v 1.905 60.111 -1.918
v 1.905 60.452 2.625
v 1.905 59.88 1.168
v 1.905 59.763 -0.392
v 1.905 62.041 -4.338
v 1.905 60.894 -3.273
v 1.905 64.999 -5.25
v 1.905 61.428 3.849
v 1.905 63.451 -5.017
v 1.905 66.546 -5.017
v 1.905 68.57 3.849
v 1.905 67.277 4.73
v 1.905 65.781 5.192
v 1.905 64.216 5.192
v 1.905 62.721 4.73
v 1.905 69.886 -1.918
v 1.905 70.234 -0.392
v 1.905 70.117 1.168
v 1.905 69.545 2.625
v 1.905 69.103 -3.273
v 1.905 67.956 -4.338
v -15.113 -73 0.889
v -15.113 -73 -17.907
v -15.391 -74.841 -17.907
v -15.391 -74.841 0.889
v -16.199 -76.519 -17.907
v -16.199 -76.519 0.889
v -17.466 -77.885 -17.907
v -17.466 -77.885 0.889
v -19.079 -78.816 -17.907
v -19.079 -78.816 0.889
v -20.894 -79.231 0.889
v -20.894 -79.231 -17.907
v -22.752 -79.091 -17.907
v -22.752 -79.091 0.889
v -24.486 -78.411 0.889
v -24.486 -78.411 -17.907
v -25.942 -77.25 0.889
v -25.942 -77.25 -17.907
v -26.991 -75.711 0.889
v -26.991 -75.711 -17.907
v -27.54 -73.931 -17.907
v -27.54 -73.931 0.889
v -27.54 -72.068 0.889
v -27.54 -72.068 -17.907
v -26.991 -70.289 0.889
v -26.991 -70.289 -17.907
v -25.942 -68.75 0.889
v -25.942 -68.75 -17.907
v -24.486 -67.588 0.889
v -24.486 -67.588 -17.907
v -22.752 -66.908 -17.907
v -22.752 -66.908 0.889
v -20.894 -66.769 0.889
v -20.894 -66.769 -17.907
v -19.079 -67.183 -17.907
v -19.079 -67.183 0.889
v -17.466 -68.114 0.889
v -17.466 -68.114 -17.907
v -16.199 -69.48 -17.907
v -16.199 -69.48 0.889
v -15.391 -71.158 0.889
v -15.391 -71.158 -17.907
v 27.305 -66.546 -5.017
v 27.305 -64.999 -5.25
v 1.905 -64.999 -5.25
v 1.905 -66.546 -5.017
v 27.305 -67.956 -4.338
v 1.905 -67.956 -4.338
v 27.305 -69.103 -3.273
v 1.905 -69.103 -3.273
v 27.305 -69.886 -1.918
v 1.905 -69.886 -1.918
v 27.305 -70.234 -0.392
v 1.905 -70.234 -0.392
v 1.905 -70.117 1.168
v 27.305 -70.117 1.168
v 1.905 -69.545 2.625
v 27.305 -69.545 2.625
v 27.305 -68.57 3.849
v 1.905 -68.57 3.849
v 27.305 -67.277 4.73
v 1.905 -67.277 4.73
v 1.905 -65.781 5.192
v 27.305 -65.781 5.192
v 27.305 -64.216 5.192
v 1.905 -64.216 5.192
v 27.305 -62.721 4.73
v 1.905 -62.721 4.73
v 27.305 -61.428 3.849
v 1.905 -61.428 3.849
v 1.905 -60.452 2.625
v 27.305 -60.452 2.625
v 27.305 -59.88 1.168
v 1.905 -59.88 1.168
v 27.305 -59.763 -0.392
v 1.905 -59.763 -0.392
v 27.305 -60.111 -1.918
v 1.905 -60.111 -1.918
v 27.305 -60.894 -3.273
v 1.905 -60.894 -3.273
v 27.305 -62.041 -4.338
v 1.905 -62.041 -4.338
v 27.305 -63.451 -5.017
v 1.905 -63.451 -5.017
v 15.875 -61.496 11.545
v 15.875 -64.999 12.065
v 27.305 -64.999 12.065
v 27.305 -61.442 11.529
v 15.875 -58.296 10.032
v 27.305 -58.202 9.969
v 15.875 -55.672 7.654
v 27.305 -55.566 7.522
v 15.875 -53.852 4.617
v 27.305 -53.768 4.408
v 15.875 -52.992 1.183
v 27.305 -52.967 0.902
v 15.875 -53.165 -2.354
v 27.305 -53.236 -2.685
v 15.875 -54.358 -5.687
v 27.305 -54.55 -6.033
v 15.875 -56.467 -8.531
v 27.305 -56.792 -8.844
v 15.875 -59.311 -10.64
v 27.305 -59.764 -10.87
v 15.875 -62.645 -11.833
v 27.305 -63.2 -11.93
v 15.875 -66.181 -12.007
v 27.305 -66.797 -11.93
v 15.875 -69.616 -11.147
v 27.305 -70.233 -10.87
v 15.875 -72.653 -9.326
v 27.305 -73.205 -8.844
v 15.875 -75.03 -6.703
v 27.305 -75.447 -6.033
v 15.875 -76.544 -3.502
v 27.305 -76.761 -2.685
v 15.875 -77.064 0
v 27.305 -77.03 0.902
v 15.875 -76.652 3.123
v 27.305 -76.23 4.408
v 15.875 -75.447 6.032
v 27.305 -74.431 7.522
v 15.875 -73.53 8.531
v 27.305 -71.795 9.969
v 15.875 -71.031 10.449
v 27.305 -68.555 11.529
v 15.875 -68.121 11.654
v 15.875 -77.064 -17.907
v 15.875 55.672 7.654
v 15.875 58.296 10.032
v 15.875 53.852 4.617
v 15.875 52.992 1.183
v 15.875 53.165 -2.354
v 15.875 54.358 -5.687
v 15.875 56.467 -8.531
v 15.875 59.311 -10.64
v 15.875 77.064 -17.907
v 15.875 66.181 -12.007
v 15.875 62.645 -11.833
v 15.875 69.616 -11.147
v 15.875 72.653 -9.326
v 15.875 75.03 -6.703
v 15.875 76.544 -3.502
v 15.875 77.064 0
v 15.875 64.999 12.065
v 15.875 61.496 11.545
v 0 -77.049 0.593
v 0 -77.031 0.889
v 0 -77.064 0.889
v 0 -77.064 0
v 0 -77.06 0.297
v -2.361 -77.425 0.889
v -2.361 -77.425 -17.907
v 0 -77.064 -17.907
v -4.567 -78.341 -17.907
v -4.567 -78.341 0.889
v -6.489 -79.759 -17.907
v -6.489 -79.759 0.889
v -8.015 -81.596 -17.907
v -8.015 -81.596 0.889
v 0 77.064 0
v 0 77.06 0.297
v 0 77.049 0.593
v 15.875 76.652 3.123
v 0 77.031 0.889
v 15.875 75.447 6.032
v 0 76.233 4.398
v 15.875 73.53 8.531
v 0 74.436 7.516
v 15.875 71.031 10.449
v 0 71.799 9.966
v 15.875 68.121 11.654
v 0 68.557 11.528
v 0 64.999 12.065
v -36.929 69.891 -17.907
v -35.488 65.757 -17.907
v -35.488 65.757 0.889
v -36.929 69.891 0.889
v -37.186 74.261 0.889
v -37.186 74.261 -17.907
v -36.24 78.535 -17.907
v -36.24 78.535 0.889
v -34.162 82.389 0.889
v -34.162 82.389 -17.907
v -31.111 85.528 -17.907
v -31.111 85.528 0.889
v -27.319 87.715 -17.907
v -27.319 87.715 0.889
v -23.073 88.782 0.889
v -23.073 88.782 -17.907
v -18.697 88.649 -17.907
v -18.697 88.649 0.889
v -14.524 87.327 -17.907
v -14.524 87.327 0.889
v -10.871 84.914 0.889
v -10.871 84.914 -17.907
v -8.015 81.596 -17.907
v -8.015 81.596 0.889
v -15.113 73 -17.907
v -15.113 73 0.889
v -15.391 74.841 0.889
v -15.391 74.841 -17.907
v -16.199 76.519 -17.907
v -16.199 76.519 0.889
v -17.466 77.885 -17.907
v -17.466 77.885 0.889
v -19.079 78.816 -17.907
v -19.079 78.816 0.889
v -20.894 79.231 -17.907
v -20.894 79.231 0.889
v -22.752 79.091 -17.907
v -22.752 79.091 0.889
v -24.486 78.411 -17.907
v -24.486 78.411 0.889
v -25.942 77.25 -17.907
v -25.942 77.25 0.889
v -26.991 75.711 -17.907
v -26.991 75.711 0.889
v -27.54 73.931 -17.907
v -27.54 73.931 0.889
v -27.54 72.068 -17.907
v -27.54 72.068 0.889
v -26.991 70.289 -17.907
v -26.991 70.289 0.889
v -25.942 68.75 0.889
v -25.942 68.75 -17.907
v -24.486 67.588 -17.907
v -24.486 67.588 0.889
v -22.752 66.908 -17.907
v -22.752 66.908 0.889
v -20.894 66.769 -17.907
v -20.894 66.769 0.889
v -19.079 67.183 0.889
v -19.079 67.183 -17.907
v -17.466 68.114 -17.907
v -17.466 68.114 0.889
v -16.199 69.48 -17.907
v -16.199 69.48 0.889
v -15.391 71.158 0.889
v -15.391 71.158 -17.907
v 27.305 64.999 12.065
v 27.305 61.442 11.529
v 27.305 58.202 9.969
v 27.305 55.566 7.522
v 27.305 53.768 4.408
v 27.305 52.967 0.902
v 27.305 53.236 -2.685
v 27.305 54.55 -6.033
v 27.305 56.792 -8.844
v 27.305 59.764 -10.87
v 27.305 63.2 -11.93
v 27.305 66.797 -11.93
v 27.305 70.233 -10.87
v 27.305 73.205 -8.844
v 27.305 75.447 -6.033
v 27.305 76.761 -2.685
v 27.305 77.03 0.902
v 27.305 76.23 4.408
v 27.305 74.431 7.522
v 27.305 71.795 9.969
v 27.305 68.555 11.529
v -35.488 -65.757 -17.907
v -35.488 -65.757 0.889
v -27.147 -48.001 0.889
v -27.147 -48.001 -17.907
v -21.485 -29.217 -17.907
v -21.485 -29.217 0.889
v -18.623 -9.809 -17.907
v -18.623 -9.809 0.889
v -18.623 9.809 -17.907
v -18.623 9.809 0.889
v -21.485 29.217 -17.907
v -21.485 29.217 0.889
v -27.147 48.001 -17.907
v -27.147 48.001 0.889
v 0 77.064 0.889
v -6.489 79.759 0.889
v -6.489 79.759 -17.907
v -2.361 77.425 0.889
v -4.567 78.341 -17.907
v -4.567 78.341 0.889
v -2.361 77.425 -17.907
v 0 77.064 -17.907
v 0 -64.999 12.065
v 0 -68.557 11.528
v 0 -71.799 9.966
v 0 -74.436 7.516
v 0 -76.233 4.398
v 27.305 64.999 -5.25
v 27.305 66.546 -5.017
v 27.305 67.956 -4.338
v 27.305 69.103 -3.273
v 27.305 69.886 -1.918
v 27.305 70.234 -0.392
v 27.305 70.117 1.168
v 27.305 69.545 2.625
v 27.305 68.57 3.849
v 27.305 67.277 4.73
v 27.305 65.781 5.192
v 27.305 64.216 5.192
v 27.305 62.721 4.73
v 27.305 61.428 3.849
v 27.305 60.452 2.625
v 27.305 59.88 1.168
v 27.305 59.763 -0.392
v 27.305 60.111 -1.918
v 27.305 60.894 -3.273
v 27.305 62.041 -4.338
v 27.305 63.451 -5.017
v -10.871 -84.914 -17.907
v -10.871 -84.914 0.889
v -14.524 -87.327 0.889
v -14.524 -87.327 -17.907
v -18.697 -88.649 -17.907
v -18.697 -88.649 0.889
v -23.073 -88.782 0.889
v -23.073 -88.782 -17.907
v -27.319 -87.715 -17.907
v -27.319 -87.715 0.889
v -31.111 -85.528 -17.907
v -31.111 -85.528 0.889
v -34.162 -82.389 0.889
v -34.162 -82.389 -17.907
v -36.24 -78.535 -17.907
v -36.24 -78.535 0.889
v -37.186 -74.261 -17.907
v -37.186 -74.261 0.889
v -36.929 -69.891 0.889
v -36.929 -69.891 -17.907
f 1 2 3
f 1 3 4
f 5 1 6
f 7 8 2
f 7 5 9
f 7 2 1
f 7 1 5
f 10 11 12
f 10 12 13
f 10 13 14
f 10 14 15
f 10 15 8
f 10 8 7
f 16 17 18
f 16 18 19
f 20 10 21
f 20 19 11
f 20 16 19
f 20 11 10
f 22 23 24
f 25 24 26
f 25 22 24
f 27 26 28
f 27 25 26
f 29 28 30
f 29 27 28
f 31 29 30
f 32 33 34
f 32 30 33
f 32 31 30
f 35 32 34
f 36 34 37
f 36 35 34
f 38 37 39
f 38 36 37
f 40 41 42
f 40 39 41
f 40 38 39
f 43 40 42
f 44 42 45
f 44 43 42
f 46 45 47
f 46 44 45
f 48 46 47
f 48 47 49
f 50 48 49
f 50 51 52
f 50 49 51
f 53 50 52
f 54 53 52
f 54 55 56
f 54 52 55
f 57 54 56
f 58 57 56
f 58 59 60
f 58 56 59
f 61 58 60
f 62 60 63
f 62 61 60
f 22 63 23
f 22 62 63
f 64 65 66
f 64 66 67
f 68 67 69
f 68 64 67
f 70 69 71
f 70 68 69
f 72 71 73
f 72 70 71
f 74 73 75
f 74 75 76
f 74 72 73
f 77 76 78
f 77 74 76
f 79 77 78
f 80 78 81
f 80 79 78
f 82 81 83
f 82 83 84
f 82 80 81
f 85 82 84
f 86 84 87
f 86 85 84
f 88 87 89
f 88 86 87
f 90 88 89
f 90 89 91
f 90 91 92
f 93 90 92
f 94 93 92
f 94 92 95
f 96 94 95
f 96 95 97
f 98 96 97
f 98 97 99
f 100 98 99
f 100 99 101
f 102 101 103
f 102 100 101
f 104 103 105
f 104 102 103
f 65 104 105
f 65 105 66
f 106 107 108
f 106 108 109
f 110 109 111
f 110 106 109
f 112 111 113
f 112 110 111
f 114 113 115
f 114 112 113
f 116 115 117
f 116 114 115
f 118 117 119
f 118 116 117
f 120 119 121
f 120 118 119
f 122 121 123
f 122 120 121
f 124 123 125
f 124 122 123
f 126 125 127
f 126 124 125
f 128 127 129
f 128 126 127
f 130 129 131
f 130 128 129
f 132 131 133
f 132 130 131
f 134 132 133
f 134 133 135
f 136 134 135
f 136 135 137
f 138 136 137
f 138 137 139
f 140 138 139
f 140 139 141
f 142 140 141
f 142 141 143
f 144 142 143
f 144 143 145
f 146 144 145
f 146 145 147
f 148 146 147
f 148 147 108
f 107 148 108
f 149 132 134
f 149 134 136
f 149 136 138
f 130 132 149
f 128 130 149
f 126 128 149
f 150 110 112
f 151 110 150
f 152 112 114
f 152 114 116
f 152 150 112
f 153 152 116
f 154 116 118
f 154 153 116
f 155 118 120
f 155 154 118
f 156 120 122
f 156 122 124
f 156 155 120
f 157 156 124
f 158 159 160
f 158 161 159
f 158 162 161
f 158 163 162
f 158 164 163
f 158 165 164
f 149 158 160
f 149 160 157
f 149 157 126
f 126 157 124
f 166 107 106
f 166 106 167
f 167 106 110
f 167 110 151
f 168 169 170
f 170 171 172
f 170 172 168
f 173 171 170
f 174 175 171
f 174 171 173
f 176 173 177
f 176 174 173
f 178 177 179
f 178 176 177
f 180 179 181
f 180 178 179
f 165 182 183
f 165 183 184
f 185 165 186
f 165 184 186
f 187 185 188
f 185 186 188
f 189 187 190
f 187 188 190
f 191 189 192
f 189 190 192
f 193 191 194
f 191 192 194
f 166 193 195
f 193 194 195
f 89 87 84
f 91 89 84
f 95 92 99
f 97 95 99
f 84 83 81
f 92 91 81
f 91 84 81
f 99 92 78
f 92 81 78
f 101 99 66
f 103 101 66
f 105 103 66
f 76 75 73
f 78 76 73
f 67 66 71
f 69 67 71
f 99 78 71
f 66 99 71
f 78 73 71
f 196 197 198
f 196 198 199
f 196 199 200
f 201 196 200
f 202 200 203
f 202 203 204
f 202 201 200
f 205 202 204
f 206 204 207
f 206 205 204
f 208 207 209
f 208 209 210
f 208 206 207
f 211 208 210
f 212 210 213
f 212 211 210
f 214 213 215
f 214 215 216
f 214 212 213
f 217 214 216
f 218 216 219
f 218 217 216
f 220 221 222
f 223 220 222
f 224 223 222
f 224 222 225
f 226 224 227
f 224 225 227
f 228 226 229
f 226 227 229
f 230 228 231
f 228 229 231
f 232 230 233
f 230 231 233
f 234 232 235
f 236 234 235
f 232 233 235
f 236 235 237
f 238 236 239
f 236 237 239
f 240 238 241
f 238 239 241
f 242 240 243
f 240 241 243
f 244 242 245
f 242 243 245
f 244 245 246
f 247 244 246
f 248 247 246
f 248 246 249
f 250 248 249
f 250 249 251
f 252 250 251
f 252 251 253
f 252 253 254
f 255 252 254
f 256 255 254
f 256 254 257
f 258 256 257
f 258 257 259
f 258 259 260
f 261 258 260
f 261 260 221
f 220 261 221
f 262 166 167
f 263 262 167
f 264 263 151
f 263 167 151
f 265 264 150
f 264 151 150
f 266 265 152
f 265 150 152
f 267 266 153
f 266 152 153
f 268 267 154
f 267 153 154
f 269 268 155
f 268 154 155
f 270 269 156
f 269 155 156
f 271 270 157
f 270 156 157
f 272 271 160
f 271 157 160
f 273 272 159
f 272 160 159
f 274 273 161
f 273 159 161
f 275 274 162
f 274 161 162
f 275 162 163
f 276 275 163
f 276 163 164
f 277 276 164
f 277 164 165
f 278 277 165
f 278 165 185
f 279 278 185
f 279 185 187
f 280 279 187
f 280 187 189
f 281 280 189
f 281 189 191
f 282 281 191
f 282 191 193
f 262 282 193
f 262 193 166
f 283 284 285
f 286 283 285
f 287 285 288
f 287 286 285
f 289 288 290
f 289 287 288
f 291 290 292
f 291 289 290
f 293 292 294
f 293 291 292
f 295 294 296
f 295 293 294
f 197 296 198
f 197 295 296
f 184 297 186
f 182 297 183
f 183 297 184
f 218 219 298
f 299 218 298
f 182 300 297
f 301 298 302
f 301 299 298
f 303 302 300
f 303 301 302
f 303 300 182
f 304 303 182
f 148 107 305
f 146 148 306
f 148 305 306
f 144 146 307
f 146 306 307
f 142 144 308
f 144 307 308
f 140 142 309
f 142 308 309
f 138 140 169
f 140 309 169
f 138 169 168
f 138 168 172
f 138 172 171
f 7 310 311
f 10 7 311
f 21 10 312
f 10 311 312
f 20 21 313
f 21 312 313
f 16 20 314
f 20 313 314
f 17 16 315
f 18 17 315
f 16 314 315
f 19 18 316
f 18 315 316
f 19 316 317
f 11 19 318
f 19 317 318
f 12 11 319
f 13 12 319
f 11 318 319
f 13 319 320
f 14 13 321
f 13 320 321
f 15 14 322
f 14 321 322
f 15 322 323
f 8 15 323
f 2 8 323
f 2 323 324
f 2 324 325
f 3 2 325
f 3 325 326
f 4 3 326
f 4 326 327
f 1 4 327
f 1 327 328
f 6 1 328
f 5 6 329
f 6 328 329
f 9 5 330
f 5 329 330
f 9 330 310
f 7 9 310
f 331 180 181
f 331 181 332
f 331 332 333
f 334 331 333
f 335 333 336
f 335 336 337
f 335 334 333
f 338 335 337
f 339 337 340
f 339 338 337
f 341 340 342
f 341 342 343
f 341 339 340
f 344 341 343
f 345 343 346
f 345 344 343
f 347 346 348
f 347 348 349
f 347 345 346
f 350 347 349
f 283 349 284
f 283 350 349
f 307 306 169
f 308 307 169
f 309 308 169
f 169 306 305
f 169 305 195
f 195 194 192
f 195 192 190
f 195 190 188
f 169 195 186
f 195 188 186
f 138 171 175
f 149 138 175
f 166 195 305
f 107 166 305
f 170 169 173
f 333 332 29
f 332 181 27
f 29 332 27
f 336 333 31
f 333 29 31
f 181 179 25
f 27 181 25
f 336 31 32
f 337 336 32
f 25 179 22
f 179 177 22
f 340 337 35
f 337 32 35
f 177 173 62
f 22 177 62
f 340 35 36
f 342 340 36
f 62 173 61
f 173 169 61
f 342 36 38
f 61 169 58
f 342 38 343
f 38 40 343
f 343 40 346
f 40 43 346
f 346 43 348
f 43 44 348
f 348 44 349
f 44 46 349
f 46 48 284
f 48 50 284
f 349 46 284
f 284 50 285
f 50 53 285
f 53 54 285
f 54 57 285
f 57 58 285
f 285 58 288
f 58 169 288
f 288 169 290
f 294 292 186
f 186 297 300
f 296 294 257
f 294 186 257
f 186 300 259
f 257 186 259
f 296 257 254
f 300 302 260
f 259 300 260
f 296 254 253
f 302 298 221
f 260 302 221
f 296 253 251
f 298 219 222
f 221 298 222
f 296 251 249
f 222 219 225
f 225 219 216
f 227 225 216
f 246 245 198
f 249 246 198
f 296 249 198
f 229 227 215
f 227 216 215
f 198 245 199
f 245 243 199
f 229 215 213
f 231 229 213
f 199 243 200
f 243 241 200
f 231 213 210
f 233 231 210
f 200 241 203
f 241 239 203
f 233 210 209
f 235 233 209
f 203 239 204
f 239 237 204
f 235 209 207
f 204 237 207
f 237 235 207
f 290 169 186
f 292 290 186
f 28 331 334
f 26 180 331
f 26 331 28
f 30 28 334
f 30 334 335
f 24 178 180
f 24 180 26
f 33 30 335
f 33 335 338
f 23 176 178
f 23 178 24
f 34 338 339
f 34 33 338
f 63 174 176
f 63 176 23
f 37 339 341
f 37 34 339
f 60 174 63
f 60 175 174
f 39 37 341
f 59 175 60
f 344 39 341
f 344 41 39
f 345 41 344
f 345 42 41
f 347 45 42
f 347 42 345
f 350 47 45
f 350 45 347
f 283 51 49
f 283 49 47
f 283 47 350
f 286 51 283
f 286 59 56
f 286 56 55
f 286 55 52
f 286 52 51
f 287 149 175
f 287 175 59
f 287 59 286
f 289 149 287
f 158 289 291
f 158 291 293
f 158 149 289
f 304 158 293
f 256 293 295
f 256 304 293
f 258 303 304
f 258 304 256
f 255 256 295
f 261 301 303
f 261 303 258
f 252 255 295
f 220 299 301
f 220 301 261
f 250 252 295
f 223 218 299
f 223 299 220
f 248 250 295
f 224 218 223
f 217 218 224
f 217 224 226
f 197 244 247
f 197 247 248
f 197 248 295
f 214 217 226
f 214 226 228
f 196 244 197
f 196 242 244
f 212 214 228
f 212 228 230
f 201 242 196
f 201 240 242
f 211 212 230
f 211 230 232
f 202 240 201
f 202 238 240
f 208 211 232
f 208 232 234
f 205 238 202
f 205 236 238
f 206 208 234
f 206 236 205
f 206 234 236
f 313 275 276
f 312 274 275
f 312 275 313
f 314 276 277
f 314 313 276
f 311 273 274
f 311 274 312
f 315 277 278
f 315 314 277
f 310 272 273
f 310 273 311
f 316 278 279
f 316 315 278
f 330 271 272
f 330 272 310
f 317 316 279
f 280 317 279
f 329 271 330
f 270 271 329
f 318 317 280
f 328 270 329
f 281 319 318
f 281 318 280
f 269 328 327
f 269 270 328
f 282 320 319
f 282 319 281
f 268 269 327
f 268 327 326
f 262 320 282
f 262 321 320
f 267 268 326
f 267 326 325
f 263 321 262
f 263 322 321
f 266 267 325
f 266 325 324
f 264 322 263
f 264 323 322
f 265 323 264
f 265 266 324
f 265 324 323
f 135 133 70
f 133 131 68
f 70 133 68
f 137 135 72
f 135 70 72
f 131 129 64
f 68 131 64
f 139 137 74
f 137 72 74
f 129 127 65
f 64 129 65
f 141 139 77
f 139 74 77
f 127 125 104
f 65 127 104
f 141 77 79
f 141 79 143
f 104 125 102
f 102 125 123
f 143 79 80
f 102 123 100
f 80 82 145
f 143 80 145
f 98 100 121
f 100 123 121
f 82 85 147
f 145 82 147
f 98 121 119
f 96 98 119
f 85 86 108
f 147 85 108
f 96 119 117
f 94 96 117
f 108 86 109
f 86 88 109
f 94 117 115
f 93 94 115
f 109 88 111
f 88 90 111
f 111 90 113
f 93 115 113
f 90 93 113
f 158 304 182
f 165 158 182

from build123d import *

# Parameters (mm, degrees)
EXTRUDE1_DEPTH     = 15.875
SKETCH2_R          = 12.065
EXTRUDE2_DEPTH     = 11.43
EXTRUDE4_DEPTH     = 18.796
SKETCH5_R          = 6.2484
CUT_EXTRUDE1_DEPTH = 19.796
SKETCH7_R          = 5.25018
CUT_EXTRUDE2_DEPTH = 25.4


with BuildPart() as part:
    # Sketch1 → Extrude1 (new body)
    with BuildSketch(Plane(origin=(0, 0, 0), x_dir=(0, 0, -1), z_dir=(1, 0, 0))):
        with BuildLine():
            Line((17.907, -77.0636), (17.907, 77.0636))
            Line((17.907, 77.0636), (0, 77.0636))
            ThreePointArc((0, 77.0636), (-8.531243315, 73.529843315), (-12.065, 64.9986))
            Line((-12.065, 64.9986), (-12.065, -64.9986))
            ThreePointArc((-12.065, -64.9986), (-8.531243315, -73.529843315), (0, -77.0636))
            Line((0, -77.0636), (17.907, -77.0636))
        make_face()
    extrude(amount=EXTRUDE1_DEPTH)

    # Sketch2 → Extrude2 (add)
    with BuildSketch(Plane(origin=(15.875, 0, 0), x_dir=(0, 0, -1), z_dir=(1, 0, 0))):
        with Locations(Location((0, 64.9986, 0), (0, 0, 180))):  # turned: the seam where the file's is
            Circle(SKETCH2_R)
    extrude2 = extrude(amount=EXTRUDE2_DEPTH)

    # Mirror of Extrude 2: Extrude2 across plane
    add(extrude2.mirror(Plane.ZX))

    # Sketch4 → Extrude4 (add)
    with BuildSketch(Plane(origin=(0, 0, -17.907), x_dir=(-1, 0, 0), z_dir=(0, 0, -1))):
        with BuildLine():
            ThreePointArc((8.015455062, 81.59619111), (4.56701856, 78.340842715), (0, 77.0636))
            Line((0, 77.0636), (0, -77.0636))
            ThreePointArc((0, -77.0636), (4.56701856, -78.340842715), (8.015455062, -81.59619111))
            ThreePointArc((8.015455062, -81.59619111), (29.290525196, -86.75258508), (35.488071258, -65.757170562))
            ThreePointArc((35.488071258, -65.757170562), (18.264230861, 0), (35.488071258, 65.757170562))
            ThreePointArc((35.488071258, 65.757170562), (29.290525196, 86.75258508), (8.015455062, 81.59619111))
        make_face()
    extrude(amount=-EXTRUDE4_DEPTH)

    # Sketch5 → Cut-Extrude1 (cut, through all)
    with BuildSketch(Plane.XY.offset(0.889)):
        with Locations((-21.3614, 72.9996)):
            Circle(SKETCH5_R)
    cut_extrude1 = extrude(amount=-CUT_EXTRUDE1_DEPTH, mode=Mode.SUBTRACT)

    # Sketch7 → Cut-Extrude2 (cut)
    with BuildSketch(Plane(origin=(27.305, 0, 0), x_dir=(0, 0, -1), z_dir=(1, 0, 0))):
        with Locations((0, 64.9986)):
            Circle(SKETCH7_R)
    cut_extrude2 = extrude(amount=-CUT_EXTRUDE2_DEPTH, mode=Mode.SUBTRACT)

    # Mirror1: Cut-Extrude1, Cut-Extrude2 across plane
    add(cut_extrude1.mirror(Plane.ZX), mode=Mode.SUBTRACT)
    add(cut_extrude2.mirror(Plane.ZX), mode=Mode.SUBTRACT)


solid = part.part
